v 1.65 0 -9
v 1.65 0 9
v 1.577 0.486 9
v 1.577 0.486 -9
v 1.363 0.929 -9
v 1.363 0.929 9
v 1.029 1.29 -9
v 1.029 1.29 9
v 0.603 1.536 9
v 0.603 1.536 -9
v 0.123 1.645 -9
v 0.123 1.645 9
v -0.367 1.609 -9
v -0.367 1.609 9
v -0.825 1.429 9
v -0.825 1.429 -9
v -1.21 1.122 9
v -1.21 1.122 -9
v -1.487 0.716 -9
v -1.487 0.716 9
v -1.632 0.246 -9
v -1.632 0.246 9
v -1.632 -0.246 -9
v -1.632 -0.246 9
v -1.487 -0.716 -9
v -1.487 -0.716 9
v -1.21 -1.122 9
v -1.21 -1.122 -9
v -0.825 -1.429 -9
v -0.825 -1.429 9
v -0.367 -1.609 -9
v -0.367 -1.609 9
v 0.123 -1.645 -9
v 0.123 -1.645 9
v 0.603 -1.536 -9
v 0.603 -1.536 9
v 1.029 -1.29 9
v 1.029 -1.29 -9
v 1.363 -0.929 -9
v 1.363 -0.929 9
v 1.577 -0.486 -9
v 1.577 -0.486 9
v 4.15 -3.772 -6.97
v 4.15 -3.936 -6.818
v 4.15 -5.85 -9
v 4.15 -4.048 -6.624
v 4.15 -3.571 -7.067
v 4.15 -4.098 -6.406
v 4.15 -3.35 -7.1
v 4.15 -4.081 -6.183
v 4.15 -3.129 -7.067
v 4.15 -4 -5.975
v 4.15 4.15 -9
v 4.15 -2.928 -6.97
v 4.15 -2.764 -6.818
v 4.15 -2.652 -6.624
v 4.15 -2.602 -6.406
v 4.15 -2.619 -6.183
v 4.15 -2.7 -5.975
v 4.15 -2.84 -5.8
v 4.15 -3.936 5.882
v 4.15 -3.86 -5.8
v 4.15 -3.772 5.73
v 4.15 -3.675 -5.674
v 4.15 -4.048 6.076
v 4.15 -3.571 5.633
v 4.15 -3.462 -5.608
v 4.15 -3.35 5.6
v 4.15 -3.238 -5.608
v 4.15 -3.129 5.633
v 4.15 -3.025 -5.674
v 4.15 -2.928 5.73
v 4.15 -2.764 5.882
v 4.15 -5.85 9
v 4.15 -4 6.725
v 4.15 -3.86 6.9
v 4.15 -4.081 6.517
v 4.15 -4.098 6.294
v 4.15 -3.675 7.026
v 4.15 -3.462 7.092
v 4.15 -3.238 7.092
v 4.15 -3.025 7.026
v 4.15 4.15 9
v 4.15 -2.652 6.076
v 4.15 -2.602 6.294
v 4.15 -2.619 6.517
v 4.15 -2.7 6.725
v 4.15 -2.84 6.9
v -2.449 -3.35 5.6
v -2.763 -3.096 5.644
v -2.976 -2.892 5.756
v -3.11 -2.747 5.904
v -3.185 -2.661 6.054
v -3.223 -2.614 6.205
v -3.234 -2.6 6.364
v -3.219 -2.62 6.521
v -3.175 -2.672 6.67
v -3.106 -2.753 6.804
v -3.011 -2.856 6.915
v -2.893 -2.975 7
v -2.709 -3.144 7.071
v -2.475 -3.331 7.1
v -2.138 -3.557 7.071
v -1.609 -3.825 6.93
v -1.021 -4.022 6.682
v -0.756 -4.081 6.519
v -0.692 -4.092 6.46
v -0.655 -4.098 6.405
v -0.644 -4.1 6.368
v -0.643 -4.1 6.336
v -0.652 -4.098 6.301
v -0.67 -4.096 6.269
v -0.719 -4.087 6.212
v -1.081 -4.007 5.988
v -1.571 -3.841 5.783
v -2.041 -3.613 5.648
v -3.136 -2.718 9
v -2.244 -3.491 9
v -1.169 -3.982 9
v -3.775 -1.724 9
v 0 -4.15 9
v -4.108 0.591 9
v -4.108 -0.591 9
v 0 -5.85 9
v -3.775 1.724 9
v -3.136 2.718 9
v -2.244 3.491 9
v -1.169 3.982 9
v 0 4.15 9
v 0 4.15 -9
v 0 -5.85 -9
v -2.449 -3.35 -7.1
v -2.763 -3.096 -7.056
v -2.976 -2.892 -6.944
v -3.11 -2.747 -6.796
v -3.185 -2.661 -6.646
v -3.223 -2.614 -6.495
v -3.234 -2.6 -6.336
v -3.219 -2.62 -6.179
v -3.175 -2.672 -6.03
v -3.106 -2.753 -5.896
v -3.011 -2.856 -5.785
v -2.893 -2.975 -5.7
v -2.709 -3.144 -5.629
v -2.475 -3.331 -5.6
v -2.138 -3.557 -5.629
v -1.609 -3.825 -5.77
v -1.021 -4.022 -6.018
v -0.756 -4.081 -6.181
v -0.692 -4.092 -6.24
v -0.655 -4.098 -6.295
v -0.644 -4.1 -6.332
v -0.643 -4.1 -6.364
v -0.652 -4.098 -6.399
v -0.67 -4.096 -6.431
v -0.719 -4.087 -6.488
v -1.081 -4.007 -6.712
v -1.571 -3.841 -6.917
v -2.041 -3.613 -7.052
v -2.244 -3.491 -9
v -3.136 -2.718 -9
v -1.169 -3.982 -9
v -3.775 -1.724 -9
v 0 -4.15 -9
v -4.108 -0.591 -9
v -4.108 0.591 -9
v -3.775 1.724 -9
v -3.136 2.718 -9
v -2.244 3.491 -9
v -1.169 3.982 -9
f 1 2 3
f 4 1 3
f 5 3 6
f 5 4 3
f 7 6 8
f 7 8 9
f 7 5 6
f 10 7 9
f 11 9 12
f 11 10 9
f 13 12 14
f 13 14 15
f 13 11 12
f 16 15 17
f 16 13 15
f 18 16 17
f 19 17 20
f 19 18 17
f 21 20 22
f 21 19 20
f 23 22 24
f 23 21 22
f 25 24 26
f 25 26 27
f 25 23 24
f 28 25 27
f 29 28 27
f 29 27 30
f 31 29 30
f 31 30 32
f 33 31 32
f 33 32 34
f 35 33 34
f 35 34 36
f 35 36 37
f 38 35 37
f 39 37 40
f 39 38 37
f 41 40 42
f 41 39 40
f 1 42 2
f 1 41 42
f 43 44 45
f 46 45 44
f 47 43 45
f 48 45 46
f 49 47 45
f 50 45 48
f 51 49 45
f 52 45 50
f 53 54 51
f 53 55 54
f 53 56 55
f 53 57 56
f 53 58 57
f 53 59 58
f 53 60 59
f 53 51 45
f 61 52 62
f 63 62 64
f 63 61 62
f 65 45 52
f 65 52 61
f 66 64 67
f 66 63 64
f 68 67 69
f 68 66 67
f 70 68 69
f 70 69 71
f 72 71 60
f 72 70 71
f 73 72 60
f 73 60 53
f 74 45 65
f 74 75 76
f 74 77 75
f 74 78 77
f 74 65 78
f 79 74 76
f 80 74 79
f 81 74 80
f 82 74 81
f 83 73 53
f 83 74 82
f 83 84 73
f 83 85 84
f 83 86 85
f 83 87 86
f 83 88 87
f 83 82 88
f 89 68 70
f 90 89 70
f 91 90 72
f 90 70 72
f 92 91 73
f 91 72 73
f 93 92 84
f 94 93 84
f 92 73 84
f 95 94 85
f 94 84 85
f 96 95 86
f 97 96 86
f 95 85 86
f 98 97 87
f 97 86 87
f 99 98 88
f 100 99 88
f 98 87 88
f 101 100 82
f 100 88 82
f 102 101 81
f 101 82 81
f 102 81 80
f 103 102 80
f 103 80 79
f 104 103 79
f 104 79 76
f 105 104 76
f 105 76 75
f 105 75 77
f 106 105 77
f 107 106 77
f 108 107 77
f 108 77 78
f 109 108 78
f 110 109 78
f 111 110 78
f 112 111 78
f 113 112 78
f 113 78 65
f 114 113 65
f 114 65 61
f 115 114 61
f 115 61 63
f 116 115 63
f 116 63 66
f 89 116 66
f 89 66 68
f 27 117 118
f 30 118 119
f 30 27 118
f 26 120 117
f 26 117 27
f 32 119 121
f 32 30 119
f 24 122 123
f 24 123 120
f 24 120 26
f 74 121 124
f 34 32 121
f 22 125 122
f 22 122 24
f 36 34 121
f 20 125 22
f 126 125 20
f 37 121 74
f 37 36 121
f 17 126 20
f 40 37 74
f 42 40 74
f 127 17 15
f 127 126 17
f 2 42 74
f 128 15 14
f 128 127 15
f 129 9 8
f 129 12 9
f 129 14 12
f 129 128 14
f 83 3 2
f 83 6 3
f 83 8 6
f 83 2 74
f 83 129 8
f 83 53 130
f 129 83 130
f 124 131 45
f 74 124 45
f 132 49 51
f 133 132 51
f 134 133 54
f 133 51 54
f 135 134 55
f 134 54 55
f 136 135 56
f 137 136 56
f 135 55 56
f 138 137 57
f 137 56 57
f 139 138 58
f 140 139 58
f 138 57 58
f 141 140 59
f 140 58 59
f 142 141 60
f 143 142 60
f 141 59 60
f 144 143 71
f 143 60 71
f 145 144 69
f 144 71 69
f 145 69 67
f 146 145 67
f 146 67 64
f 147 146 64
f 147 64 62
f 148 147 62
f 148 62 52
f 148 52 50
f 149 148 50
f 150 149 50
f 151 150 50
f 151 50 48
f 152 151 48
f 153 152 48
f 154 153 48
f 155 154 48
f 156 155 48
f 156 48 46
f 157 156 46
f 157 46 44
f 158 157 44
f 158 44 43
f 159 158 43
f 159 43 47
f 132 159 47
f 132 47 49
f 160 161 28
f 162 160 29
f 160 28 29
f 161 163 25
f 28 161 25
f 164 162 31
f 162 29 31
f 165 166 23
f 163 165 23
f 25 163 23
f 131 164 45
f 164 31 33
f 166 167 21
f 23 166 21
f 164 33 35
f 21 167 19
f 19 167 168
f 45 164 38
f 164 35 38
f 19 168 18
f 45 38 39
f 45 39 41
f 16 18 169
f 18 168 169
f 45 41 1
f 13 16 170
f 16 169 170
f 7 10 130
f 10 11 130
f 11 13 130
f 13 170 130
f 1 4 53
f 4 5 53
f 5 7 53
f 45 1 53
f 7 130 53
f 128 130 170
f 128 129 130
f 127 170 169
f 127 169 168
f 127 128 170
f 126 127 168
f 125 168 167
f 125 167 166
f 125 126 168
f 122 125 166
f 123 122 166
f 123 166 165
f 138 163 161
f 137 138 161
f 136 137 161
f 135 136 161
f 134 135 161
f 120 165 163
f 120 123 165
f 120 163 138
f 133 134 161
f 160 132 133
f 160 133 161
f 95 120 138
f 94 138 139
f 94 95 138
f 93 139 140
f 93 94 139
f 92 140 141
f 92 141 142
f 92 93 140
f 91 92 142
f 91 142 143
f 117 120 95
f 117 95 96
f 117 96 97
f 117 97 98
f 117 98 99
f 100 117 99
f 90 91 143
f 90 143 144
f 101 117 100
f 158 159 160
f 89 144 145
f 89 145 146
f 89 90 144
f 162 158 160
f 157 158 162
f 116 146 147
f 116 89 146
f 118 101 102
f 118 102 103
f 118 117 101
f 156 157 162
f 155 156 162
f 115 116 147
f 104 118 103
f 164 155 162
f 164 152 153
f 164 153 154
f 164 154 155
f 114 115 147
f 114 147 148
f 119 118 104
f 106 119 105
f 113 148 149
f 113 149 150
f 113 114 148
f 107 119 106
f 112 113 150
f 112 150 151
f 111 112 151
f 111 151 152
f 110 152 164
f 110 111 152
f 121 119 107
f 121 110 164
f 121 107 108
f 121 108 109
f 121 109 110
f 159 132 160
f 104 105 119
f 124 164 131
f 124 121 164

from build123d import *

# Parameters (mm, degrees)
ESQUISSE1_R             = 1.65
BOSS_EXTRU_1_DEPTH      = 9
ESQUISSE2_R             = 0.75
ENL_V_MAT_EXTRU_1_DEPTH = 14.568806138


with BuildPart() as part:
    # Esquisse1 → Boss.-Extru.1 (new, symmetric)
    with BuildSketch(Plane.XY):
        with BuildLine():
            Line((0, -4.15), (0, -5.85))
            Line((0, -5.85), (4.15, -5.85))
            Line((4.15, -5.85), (4.15, 4.15))
            Line((4.15, 4.15), (0, 4.15))
            ThreePointArc((0, 4.15), (-4.15, 0), (0, -4.15))
        make_face()
        Circle(ESQUISSE1_R, mode=Mode.SUBTRACT)
    extrude(amount=BOSS_EXTRU_1_DEPTH, both=True)

    # Esquisse2 → Enlèv. mat.-Extru.1 (cut, through all)
    with BuildSketch(Plane(origin=(4.15, 0, 0), x_dir=(0, 0, -1), z_dir=(1, 0, 0))):
        with Locations((-6.35, -3.35)):
            Circle(ESQUISSE2_R)
        with Locations((6.35, -3.35)):
            Circle(ESQUISSE2_R)
    extrude(amount=-ENL_V_MAT_EXTRU_1_DEPTH, mode=Mode.SUBTRACT)


solid = part.part
